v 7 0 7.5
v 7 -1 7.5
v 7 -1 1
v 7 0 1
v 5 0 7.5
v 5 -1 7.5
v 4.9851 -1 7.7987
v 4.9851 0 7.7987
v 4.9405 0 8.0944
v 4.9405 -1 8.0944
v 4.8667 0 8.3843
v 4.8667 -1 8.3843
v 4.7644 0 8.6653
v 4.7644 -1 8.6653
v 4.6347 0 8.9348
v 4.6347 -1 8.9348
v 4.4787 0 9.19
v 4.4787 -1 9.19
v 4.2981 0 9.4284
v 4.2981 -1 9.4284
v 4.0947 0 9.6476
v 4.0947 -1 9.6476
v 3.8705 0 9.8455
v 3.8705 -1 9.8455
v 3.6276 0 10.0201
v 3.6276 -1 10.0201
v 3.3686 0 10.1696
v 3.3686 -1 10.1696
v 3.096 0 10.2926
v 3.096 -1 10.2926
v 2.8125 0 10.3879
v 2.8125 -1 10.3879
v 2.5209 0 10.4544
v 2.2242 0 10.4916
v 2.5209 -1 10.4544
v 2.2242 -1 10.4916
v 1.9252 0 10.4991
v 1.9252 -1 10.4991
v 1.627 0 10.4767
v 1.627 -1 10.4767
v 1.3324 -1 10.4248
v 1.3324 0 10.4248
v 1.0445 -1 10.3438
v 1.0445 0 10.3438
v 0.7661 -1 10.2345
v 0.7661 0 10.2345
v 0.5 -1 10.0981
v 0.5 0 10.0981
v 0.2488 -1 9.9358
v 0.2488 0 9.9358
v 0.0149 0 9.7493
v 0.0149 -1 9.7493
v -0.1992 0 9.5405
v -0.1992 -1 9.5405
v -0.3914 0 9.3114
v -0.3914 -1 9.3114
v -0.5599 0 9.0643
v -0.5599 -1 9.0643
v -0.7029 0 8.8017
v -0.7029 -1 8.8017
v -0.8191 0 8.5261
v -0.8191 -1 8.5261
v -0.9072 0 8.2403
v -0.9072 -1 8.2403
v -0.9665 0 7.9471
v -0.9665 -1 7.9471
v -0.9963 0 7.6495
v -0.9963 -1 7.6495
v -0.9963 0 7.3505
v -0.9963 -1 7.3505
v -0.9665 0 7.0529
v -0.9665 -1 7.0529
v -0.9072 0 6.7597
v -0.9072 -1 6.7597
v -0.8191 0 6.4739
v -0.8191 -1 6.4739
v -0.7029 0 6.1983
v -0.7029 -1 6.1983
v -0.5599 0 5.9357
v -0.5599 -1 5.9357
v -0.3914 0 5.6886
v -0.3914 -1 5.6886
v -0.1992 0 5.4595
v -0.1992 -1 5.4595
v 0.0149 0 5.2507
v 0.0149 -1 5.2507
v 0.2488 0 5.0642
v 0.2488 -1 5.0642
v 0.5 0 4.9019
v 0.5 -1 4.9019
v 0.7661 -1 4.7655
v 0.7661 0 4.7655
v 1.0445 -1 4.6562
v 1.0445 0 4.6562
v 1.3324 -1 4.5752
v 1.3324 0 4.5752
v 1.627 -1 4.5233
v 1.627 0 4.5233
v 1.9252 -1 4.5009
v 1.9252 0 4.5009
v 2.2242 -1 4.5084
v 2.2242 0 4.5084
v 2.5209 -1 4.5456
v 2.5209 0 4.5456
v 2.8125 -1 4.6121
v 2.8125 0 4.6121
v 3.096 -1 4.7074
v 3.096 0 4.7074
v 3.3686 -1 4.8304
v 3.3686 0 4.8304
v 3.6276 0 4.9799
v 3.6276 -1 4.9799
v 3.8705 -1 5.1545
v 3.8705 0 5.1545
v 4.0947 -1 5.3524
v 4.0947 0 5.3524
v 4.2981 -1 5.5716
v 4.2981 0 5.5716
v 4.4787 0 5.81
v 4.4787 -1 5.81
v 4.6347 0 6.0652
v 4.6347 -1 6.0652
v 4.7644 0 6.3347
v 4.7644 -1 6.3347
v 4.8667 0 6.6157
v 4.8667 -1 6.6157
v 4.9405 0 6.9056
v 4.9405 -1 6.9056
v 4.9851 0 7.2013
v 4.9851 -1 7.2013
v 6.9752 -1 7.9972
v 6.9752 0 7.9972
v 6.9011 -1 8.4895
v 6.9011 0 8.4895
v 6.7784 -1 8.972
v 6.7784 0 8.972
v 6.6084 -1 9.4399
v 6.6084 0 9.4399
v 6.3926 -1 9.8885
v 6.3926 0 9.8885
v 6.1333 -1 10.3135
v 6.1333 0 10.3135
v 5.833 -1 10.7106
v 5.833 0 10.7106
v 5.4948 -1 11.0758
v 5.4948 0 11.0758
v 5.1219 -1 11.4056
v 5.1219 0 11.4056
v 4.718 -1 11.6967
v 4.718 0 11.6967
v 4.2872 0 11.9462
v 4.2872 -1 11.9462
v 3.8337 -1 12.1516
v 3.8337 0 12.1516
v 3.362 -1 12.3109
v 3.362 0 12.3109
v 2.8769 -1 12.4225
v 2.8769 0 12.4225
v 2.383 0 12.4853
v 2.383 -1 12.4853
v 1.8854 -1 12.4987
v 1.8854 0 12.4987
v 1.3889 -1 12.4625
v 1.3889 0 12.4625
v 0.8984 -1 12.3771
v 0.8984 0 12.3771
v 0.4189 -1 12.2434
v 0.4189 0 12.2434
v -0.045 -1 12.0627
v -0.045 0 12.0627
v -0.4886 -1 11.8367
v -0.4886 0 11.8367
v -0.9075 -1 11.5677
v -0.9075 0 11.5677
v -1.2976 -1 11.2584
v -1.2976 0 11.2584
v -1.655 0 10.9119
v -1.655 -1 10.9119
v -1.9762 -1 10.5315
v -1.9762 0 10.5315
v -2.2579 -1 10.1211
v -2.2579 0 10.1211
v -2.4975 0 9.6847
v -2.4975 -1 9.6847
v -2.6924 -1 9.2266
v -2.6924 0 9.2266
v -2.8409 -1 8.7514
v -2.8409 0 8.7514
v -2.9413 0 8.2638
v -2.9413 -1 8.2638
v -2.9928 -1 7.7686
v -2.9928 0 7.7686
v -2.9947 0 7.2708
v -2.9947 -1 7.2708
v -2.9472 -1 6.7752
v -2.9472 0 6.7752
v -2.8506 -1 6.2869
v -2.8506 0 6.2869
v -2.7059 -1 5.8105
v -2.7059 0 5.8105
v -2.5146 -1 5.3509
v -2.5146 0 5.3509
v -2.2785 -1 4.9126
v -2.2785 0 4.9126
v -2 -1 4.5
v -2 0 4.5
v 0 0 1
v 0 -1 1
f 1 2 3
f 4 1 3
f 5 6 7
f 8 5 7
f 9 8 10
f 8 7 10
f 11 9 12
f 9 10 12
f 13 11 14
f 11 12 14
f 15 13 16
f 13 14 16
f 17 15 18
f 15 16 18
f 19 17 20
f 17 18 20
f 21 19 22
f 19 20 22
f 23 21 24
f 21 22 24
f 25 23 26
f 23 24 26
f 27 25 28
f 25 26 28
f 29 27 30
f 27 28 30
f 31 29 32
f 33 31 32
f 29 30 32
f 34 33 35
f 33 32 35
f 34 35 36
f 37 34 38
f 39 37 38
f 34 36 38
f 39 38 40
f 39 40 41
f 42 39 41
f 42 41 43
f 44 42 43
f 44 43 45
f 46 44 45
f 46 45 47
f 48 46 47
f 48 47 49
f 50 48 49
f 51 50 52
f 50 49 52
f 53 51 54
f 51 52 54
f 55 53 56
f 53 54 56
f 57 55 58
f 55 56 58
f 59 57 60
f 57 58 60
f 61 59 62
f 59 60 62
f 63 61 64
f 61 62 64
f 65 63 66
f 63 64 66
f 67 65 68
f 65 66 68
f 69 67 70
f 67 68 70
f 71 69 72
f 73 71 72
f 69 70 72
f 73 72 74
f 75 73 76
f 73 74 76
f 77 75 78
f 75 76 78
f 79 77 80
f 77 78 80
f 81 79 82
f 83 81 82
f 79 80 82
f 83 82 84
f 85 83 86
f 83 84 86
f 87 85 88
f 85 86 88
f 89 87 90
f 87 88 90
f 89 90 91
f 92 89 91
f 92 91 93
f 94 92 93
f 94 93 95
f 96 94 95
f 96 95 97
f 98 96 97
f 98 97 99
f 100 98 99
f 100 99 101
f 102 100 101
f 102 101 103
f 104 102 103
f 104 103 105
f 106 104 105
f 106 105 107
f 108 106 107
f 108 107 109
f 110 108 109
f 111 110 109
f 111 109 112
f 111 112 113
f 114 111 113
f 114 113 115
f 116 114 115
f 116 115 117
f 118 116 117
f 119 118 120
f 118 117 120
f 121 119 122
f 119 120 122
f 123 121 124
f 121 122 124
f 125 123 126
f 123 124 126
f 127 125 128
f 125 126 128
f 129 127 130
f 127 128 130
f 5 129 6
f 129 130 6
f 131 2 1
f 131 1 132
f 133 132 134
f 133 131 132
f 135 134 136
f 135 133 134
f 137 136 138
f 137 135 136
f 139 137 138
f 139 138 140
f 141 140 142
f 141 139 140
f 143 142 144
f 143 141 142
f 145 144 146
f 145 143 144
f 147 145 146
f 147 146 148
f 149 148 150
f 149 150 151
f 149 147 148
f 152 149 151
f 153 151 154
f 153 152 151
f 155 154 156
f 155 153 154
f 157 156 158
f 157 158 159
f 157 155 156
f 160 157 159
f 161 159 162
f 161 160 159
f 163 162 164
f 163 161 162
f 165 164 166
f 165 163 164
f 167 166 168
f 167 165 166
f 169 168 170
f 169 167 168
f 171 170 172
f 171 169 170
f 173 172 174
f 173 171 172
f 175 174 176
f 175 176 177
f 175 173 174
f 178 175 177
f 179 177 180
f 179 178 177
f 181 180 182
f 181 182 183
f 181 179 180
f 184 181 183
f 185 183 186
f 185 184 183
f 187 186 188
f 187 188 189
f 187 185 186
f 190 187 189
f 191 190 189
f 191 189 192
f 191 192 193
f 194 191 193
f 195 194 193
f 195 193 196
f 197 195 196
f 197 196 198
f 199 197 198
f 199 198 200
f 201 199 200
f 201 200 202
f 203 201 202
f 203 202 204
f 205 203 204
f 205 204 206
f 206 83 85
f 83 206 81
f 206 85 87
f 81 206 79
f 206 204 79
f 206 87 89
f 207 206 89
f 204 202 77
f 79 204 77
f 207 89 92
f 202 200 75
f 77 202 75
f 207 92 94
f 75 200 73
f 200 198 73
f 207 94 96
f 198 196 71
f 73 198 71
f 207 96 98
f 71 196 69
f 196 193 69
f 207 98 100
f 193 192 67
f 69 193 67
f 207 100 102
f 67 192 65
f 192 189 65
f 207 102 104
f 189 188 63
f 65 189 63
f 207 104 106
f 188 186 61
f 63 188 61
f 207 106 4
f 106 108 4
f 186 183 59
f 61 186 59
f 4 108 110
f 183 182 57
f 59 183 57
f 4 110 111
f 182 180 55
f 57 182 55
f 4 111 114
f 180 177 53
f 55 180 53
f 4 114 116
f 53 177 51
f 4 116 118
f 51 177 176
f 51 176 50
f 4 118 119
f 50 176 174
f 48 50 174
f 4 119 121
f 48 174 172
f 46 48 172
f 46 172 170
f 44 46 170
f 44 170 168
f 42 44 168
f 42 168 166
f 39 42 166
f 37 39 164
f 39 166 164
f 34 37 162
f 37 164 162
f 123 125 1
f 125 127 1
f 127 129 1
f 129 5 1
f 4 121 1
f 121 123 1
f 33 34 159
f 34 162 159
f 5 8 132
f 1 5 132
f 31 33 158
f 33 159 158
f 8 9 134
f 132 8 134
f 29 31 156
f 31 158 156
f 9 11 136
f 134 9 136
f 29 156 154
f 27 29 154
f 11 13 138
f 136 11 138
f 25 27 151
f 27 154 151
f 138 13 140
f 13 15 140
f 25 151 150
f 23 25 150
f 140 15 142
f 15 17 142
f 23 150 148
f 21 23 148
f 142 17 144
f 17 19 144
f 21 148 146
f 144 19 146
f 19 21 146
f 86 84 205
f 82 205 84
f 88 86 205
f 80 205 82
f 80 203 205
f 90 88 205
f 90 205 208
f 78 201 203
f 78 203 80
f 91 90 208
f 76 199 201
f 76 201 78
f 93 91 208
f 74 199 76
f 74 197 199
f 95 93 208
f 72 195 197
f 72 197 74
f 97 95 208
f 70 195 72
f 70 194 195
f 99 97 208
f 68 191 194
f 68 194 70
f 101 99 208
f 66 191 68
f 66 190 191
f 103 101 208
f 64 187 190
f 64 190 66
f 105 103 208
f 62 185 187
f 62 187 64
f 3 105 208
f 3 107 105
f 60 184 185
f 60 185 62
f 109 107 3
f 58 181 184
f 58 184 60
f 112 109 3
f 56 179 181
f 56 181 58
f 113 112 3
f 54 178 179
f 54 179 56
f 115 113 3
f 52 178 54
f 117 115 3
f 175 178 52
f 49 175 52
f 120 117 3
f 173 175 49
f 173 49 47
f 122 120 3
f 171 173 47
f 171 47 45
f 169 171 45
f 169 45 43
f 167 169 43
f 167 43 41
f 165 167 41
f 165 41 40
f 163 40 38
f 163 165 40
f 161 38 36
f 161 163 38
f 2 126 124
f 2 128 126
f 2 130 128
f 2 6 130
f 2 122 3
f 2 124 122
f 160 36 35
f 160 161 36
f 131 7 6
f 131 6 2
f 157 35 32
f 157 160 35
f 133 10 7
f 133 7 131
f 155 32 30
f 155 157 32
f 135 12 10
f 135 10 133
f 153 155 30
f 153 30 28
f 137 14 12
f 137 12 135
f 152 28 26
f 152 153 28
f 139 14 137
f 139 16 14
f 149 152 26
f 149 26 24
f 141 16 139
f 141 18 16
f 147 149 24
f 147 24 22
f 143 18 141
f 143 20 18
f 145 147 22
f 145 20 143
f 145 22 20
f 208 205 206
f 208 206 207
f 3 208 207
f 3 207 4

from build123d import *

# Parameters (mm, degrees)
SKETCH274_AS_DRAWN_R                 = 3
EXTRUDE077_DEPTH                     = 1
EXTRUDE077_ONTO_SKETCH274_ROLL_ANGLE = 90
EXTRUDE076_DEPTH                     = 1
EXTRUDE076_ONTO_SKETCH273_ROLL_ANGLE = 90


with BuildPart() as extrude077:
    # Sketch274 as drawn → Extrude077 (new)
    with BuildSketch(Plane.XY):
        with Locations((2, 8)):
            Circle(SKETCH274_AS_DRAWN_R)
    extrude(amount=-EXTRUDE077_DEPTH)


with BuildPart() as extrude077_1:
    # Extrude077 onto Sketch274 roll: moved
    add(extrude077.part.rotate(Axis((0, 0, 0), (1, 0, 0)), EXTRUDE077_ONTO_SKETCH274_ROLL_ANGLE))


with BuildPart() as extrude077_2:
    # Extrude077 onto Sketch274 placement: moved
    add(extrude077_1.part.moved(Location((0, -1, -0.5))))


with BuildPart() as cut046:
    # Sketch273 as drawn → Extrude076 (new)
    with BuildSketch(Plane.XY):
        with BuildLine():
            ThreePointArc((7, 8), (0.418861, 12.743416), (-1.999999, 5))
            Line((-1.999999, 5), (0, 1.5))
            Line((0, 1.5), (7, 1.5))
            Line((7, 8), (7, 1.5))
        make_face()
    extrude(amount=-EXTRUDE076_DEPTH)


with BuildPart() as cut046_1:
    # Extrude076 onto Sketch273 roll: moved
    add(cut046.part.rotate(Axis((0, 0, 0), (1, 0, 0)), EXTRUDE076_ONTO_SKETCH273_ROLL_ANGLE))


with BuildPart() as cut046_2:
    # Extrude076 onto Sketch273 placement: moved
    add(cut046_1.part.moved(Location((0, -1, -0.5))))

    # Cut046: cut Extrude077
    add(extrude077_2.part, mode=Mode.SUBTRACT)


solid = cut046_2.part
